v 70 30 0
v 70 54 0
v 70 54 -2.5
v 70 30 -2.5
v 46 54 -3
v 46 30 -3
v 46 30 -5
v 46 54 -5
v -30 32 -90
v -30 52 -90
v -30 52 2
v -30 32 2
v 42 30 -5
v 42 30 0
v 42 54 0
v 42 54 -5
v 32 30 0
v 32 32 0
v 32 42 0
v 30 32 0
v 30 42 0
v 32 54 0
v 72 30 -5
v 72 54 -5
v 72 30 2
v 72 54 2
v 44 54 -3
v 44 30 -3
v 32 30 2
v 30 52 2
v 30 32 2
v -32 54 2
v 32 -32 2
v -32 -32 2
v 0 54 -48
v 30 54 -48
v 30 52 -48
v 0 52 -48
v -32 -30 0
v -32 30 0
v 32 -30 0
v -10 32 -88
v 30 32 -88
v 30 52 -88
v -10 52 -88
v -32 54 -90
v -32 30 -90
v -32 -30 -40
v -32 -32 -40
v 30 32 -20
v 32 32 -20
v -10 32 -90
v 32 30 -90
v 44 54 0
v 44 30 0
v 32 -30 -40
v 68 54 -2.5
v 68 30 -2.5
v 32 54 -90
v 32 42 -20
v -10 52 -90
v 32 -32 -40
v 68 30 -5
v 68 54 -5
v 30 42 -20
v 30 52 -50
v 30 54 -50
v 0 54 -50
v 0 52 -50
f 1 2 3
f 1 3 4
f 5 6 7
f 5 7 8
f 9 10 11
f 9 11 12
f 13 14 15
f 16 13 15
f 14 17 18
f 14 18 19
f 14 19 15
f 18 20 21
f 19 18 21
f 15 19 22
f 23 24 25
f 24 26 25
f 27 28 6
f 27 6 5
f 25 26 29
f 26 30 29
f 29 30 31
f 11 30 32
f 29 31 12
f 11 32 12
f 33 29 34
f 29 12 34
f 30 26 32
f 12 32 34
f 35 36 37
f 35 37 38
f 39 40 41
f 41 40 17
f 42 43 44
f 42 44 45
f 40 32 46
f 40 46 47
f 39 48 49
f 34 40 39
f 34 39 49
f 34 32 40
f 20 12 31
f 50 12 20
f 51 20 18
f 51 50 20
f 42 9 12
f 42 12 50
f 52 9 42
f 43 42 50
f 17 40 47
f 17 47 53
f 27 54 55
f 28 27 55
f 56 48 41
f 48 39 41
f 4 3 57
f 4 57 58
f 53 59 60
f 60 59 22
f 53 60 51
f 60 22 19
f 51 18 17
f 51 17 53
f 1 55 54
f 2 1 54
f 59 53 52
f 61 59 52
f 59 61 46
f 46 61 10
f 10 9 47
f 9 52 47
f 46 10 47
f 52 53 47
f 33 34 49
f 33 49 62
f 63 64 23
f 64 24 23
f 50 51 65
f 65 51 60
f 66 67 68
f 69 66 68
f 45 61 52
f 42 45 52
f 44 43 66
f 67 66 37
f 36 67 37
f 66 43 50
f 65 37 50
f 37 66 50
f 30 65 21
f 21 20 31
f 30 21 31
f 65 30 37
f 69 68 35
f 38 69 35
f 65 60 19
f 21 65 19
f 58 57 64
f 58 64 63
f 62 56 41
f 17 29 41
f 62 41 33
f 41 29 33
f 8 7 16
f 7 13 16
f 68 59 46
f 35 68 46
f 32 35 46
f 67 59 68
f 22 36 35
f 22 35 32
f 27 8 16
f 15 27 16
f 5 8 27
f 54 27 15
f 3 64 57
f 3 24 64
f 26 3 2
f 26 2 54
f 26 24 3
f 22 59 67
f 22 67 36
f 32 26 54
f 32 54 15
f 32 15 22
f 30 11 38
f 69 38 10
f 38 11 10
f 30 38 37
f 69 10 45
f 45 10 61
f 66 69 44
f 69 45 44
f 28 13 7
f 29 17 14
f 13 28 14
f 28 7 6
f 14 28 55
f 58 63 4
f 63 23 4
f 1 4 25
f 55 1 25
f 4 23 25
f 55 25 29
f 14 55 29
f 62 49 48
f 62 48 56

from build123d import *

# Parameters (mm, degrees)
F0_W      = 64
F0_H      = 64
F1_DEPTH  = 2
F2_W      = 64
F2_H      = 2
F3_DEPTH  = 25
F4_W      = 64
F4_H      = 2
F5_DEPTH  = 90
F6_W      = 2
F6_H      = 92
F7_DEPTH  = 22
F8_W      = 2
F8_H      = 92
F9_DEPTH  = 22
F10_W     = 2
F10_H     = 92
F11_DEPTH = 60
F12_W     = 60
F12_H     = 2
F13_DEPTH = 20
F14_W     = 10
F14_H     = 20
F15_DEPTH = 25
F16_W     = 20
F16_H     = 20
F17_DEPTH = 25
F3_FACE_W = 64
F3_FACE_H = 2
F18_DEPTH = 15
F19_W     = 30
F19_H     = 2
F20_DEPTH = 2
F22_DEPTH = 40
F23_W     = 2
F23_H     = 24
F24_DEPTH = 5
F25_W     = 24
F25_H     = 2
F26_DEPTH = 2
F27_W     = 24
F27_H     = 2.5
F28_DEPTH = 2


with BuildPart() as f1:
    # F0 (on Top) → F1 (new body)
    with BuildSketch(Plane.XY):
        Rectangle(F0_W, F0_H)
    extrude(amount=F1_DEPTH)

    # F2 (on face) → F3 (join)
    with BuildSketch(Plane(origin=(0, 0, 0), x_dir=(1, 0, 0), z_dir=(0, 0, -1))):
        with Locations((0, 31)):
            Rectangle(F2_W, F2_H)
    extrude(amount=F3_DEPTH)

    # F4 (on face) → F5 (join)
    with BuildSketch(Plane(origin=(0, 0, 0), x_dir=(1, 0, 0), z_dir=(0, 0, -1))):
        with Locations((0, -31)):
            Rectangle(F4_W, F4_H)
    extrude(amount=F5_DEPTH)

    # F6 (on face) → F7 (join)
    with BuildSketch(Plane(origin=(0, 32, 0), x_dir=(-1, 0, 0), z_dir=(0, 1, 0))):
        with Locations((-31, -44)):
            Rectangle(F6_W, F6_H)
    extrude(amount=F7_DEPTH)

    # F8 (on face) → F9 (join)
    with BuildSketch(Plane(origin=(0, 32, 0), x_dir=(-1, 0, 0), z_dir=(0, 1, 0))):
        with Locations((31, -44)):
            Rectangle(F8_W, F8_H)
    extrude(amount=F9_DEPTH)

    # F10 (on face) → F11 (join)
    with BuildSketch(Plane(origin=(30, 0, 0), x_dir=(0, -1, 0), z_dir=(-1, 0, 0))):
        with Locations((-53, -44)):
            Rectangle(F10_W, F10_H)
    extrude(amount=F11_DEPTH)

    # F12 (on face) → F13 (join)
    with BuildSketch(Plane(origin=(0, 32, 0), x_dir=(-1, 0, 0), z_dir=(0, 1, 0))):
        with Locations((0, -89)):
            Rectangle(F12_W, F12_H)
    extrude(amount=F13_DEPTH)

    # F14 (on face) → F15 (cut)
    with BuildSketch(Plane.YZ.offset(32)):
        with Locations((37, -10)):
            Rectangle(F14_W, F14_H)
    extrude(amount=-F15_DEPTH, mode=Mode.SUBTRACT)

    # F16 (on face) → F17 (cut)
    with BuildSketch(Plane(origin=(0, 0, -90), x_dir=(1, 0, 0), z_dir=(0, 0, -1))):
        with Locations((-20, -42)):
            Rectangle(F16_W, F16_H)
    extrude(amount=-F17_DEPTH, mode=Mode.SUBTRACT)

    # F3_face (on face) → F18 (join)
    with BuildSketch(Plane(origin=(0, -31, -25), x_dir=(1, 0, 0), z_dir=(0, 0, -1))):
        Rectangle(F3_FACE_W, F3_FACE_H)
    extrude(amount=F18_DEPTH)

    # F19 (on face) → F20 (cut)
    with BuildSketch(Plane(origin=(0, 54, 0), x_dir=(-1, 0, 0), z_dir=(0, 1, 0))):
        with Locations((-15, -49)):
            Rectangle(F19_W, F19_H)
    extrude(amount=-F20_DEPTH, mode=Mode.SUBTRACT)

    # F21 (on face) → F22 (join)
    with BuildSketch(Plane.YZ.offset(32)):
        Polygon((30, 2), (30, 0), (32, 0), (42, 0), (54, 0), (54, 2), align=None)
    extrude(amount=F22_DEPTH)

    # F23 (on face) → F24 (join)
    with BuildSketch(Plane(origin=(0, 0, 0), x_dir=(1, 0, 0), z_dir=(0, 0, -1))):
        with Locations((71, -42)):
            Rectangle(F23_W, F23_H)
        Polygon((42, -54), (44, -54), (44, -47.911588), (44, -30), (42, -30), align=None)
    extrude(amount=F24_DEPTH)

    # F25 (on face) → F26 (join)
    with BuildSketch(Plane.YZ.offset(44)):
        with Locations((42, -4)):
            Rectangle(F25_W, F25_H)
    extrude(amount=F26_DEPTH)

    # F27 (on face) → F28 (join)
    with BuildSketch(Plane(origin=(70, 0, 0), x_dir=(0, -1, 0), z_dir=(-1, 0, 0))):
        with Locations((-42, -3.75)):
            Rectangle(F27_W, F27_H)
    extrude(amount=F28_DEPTH)


solid = f1.part
